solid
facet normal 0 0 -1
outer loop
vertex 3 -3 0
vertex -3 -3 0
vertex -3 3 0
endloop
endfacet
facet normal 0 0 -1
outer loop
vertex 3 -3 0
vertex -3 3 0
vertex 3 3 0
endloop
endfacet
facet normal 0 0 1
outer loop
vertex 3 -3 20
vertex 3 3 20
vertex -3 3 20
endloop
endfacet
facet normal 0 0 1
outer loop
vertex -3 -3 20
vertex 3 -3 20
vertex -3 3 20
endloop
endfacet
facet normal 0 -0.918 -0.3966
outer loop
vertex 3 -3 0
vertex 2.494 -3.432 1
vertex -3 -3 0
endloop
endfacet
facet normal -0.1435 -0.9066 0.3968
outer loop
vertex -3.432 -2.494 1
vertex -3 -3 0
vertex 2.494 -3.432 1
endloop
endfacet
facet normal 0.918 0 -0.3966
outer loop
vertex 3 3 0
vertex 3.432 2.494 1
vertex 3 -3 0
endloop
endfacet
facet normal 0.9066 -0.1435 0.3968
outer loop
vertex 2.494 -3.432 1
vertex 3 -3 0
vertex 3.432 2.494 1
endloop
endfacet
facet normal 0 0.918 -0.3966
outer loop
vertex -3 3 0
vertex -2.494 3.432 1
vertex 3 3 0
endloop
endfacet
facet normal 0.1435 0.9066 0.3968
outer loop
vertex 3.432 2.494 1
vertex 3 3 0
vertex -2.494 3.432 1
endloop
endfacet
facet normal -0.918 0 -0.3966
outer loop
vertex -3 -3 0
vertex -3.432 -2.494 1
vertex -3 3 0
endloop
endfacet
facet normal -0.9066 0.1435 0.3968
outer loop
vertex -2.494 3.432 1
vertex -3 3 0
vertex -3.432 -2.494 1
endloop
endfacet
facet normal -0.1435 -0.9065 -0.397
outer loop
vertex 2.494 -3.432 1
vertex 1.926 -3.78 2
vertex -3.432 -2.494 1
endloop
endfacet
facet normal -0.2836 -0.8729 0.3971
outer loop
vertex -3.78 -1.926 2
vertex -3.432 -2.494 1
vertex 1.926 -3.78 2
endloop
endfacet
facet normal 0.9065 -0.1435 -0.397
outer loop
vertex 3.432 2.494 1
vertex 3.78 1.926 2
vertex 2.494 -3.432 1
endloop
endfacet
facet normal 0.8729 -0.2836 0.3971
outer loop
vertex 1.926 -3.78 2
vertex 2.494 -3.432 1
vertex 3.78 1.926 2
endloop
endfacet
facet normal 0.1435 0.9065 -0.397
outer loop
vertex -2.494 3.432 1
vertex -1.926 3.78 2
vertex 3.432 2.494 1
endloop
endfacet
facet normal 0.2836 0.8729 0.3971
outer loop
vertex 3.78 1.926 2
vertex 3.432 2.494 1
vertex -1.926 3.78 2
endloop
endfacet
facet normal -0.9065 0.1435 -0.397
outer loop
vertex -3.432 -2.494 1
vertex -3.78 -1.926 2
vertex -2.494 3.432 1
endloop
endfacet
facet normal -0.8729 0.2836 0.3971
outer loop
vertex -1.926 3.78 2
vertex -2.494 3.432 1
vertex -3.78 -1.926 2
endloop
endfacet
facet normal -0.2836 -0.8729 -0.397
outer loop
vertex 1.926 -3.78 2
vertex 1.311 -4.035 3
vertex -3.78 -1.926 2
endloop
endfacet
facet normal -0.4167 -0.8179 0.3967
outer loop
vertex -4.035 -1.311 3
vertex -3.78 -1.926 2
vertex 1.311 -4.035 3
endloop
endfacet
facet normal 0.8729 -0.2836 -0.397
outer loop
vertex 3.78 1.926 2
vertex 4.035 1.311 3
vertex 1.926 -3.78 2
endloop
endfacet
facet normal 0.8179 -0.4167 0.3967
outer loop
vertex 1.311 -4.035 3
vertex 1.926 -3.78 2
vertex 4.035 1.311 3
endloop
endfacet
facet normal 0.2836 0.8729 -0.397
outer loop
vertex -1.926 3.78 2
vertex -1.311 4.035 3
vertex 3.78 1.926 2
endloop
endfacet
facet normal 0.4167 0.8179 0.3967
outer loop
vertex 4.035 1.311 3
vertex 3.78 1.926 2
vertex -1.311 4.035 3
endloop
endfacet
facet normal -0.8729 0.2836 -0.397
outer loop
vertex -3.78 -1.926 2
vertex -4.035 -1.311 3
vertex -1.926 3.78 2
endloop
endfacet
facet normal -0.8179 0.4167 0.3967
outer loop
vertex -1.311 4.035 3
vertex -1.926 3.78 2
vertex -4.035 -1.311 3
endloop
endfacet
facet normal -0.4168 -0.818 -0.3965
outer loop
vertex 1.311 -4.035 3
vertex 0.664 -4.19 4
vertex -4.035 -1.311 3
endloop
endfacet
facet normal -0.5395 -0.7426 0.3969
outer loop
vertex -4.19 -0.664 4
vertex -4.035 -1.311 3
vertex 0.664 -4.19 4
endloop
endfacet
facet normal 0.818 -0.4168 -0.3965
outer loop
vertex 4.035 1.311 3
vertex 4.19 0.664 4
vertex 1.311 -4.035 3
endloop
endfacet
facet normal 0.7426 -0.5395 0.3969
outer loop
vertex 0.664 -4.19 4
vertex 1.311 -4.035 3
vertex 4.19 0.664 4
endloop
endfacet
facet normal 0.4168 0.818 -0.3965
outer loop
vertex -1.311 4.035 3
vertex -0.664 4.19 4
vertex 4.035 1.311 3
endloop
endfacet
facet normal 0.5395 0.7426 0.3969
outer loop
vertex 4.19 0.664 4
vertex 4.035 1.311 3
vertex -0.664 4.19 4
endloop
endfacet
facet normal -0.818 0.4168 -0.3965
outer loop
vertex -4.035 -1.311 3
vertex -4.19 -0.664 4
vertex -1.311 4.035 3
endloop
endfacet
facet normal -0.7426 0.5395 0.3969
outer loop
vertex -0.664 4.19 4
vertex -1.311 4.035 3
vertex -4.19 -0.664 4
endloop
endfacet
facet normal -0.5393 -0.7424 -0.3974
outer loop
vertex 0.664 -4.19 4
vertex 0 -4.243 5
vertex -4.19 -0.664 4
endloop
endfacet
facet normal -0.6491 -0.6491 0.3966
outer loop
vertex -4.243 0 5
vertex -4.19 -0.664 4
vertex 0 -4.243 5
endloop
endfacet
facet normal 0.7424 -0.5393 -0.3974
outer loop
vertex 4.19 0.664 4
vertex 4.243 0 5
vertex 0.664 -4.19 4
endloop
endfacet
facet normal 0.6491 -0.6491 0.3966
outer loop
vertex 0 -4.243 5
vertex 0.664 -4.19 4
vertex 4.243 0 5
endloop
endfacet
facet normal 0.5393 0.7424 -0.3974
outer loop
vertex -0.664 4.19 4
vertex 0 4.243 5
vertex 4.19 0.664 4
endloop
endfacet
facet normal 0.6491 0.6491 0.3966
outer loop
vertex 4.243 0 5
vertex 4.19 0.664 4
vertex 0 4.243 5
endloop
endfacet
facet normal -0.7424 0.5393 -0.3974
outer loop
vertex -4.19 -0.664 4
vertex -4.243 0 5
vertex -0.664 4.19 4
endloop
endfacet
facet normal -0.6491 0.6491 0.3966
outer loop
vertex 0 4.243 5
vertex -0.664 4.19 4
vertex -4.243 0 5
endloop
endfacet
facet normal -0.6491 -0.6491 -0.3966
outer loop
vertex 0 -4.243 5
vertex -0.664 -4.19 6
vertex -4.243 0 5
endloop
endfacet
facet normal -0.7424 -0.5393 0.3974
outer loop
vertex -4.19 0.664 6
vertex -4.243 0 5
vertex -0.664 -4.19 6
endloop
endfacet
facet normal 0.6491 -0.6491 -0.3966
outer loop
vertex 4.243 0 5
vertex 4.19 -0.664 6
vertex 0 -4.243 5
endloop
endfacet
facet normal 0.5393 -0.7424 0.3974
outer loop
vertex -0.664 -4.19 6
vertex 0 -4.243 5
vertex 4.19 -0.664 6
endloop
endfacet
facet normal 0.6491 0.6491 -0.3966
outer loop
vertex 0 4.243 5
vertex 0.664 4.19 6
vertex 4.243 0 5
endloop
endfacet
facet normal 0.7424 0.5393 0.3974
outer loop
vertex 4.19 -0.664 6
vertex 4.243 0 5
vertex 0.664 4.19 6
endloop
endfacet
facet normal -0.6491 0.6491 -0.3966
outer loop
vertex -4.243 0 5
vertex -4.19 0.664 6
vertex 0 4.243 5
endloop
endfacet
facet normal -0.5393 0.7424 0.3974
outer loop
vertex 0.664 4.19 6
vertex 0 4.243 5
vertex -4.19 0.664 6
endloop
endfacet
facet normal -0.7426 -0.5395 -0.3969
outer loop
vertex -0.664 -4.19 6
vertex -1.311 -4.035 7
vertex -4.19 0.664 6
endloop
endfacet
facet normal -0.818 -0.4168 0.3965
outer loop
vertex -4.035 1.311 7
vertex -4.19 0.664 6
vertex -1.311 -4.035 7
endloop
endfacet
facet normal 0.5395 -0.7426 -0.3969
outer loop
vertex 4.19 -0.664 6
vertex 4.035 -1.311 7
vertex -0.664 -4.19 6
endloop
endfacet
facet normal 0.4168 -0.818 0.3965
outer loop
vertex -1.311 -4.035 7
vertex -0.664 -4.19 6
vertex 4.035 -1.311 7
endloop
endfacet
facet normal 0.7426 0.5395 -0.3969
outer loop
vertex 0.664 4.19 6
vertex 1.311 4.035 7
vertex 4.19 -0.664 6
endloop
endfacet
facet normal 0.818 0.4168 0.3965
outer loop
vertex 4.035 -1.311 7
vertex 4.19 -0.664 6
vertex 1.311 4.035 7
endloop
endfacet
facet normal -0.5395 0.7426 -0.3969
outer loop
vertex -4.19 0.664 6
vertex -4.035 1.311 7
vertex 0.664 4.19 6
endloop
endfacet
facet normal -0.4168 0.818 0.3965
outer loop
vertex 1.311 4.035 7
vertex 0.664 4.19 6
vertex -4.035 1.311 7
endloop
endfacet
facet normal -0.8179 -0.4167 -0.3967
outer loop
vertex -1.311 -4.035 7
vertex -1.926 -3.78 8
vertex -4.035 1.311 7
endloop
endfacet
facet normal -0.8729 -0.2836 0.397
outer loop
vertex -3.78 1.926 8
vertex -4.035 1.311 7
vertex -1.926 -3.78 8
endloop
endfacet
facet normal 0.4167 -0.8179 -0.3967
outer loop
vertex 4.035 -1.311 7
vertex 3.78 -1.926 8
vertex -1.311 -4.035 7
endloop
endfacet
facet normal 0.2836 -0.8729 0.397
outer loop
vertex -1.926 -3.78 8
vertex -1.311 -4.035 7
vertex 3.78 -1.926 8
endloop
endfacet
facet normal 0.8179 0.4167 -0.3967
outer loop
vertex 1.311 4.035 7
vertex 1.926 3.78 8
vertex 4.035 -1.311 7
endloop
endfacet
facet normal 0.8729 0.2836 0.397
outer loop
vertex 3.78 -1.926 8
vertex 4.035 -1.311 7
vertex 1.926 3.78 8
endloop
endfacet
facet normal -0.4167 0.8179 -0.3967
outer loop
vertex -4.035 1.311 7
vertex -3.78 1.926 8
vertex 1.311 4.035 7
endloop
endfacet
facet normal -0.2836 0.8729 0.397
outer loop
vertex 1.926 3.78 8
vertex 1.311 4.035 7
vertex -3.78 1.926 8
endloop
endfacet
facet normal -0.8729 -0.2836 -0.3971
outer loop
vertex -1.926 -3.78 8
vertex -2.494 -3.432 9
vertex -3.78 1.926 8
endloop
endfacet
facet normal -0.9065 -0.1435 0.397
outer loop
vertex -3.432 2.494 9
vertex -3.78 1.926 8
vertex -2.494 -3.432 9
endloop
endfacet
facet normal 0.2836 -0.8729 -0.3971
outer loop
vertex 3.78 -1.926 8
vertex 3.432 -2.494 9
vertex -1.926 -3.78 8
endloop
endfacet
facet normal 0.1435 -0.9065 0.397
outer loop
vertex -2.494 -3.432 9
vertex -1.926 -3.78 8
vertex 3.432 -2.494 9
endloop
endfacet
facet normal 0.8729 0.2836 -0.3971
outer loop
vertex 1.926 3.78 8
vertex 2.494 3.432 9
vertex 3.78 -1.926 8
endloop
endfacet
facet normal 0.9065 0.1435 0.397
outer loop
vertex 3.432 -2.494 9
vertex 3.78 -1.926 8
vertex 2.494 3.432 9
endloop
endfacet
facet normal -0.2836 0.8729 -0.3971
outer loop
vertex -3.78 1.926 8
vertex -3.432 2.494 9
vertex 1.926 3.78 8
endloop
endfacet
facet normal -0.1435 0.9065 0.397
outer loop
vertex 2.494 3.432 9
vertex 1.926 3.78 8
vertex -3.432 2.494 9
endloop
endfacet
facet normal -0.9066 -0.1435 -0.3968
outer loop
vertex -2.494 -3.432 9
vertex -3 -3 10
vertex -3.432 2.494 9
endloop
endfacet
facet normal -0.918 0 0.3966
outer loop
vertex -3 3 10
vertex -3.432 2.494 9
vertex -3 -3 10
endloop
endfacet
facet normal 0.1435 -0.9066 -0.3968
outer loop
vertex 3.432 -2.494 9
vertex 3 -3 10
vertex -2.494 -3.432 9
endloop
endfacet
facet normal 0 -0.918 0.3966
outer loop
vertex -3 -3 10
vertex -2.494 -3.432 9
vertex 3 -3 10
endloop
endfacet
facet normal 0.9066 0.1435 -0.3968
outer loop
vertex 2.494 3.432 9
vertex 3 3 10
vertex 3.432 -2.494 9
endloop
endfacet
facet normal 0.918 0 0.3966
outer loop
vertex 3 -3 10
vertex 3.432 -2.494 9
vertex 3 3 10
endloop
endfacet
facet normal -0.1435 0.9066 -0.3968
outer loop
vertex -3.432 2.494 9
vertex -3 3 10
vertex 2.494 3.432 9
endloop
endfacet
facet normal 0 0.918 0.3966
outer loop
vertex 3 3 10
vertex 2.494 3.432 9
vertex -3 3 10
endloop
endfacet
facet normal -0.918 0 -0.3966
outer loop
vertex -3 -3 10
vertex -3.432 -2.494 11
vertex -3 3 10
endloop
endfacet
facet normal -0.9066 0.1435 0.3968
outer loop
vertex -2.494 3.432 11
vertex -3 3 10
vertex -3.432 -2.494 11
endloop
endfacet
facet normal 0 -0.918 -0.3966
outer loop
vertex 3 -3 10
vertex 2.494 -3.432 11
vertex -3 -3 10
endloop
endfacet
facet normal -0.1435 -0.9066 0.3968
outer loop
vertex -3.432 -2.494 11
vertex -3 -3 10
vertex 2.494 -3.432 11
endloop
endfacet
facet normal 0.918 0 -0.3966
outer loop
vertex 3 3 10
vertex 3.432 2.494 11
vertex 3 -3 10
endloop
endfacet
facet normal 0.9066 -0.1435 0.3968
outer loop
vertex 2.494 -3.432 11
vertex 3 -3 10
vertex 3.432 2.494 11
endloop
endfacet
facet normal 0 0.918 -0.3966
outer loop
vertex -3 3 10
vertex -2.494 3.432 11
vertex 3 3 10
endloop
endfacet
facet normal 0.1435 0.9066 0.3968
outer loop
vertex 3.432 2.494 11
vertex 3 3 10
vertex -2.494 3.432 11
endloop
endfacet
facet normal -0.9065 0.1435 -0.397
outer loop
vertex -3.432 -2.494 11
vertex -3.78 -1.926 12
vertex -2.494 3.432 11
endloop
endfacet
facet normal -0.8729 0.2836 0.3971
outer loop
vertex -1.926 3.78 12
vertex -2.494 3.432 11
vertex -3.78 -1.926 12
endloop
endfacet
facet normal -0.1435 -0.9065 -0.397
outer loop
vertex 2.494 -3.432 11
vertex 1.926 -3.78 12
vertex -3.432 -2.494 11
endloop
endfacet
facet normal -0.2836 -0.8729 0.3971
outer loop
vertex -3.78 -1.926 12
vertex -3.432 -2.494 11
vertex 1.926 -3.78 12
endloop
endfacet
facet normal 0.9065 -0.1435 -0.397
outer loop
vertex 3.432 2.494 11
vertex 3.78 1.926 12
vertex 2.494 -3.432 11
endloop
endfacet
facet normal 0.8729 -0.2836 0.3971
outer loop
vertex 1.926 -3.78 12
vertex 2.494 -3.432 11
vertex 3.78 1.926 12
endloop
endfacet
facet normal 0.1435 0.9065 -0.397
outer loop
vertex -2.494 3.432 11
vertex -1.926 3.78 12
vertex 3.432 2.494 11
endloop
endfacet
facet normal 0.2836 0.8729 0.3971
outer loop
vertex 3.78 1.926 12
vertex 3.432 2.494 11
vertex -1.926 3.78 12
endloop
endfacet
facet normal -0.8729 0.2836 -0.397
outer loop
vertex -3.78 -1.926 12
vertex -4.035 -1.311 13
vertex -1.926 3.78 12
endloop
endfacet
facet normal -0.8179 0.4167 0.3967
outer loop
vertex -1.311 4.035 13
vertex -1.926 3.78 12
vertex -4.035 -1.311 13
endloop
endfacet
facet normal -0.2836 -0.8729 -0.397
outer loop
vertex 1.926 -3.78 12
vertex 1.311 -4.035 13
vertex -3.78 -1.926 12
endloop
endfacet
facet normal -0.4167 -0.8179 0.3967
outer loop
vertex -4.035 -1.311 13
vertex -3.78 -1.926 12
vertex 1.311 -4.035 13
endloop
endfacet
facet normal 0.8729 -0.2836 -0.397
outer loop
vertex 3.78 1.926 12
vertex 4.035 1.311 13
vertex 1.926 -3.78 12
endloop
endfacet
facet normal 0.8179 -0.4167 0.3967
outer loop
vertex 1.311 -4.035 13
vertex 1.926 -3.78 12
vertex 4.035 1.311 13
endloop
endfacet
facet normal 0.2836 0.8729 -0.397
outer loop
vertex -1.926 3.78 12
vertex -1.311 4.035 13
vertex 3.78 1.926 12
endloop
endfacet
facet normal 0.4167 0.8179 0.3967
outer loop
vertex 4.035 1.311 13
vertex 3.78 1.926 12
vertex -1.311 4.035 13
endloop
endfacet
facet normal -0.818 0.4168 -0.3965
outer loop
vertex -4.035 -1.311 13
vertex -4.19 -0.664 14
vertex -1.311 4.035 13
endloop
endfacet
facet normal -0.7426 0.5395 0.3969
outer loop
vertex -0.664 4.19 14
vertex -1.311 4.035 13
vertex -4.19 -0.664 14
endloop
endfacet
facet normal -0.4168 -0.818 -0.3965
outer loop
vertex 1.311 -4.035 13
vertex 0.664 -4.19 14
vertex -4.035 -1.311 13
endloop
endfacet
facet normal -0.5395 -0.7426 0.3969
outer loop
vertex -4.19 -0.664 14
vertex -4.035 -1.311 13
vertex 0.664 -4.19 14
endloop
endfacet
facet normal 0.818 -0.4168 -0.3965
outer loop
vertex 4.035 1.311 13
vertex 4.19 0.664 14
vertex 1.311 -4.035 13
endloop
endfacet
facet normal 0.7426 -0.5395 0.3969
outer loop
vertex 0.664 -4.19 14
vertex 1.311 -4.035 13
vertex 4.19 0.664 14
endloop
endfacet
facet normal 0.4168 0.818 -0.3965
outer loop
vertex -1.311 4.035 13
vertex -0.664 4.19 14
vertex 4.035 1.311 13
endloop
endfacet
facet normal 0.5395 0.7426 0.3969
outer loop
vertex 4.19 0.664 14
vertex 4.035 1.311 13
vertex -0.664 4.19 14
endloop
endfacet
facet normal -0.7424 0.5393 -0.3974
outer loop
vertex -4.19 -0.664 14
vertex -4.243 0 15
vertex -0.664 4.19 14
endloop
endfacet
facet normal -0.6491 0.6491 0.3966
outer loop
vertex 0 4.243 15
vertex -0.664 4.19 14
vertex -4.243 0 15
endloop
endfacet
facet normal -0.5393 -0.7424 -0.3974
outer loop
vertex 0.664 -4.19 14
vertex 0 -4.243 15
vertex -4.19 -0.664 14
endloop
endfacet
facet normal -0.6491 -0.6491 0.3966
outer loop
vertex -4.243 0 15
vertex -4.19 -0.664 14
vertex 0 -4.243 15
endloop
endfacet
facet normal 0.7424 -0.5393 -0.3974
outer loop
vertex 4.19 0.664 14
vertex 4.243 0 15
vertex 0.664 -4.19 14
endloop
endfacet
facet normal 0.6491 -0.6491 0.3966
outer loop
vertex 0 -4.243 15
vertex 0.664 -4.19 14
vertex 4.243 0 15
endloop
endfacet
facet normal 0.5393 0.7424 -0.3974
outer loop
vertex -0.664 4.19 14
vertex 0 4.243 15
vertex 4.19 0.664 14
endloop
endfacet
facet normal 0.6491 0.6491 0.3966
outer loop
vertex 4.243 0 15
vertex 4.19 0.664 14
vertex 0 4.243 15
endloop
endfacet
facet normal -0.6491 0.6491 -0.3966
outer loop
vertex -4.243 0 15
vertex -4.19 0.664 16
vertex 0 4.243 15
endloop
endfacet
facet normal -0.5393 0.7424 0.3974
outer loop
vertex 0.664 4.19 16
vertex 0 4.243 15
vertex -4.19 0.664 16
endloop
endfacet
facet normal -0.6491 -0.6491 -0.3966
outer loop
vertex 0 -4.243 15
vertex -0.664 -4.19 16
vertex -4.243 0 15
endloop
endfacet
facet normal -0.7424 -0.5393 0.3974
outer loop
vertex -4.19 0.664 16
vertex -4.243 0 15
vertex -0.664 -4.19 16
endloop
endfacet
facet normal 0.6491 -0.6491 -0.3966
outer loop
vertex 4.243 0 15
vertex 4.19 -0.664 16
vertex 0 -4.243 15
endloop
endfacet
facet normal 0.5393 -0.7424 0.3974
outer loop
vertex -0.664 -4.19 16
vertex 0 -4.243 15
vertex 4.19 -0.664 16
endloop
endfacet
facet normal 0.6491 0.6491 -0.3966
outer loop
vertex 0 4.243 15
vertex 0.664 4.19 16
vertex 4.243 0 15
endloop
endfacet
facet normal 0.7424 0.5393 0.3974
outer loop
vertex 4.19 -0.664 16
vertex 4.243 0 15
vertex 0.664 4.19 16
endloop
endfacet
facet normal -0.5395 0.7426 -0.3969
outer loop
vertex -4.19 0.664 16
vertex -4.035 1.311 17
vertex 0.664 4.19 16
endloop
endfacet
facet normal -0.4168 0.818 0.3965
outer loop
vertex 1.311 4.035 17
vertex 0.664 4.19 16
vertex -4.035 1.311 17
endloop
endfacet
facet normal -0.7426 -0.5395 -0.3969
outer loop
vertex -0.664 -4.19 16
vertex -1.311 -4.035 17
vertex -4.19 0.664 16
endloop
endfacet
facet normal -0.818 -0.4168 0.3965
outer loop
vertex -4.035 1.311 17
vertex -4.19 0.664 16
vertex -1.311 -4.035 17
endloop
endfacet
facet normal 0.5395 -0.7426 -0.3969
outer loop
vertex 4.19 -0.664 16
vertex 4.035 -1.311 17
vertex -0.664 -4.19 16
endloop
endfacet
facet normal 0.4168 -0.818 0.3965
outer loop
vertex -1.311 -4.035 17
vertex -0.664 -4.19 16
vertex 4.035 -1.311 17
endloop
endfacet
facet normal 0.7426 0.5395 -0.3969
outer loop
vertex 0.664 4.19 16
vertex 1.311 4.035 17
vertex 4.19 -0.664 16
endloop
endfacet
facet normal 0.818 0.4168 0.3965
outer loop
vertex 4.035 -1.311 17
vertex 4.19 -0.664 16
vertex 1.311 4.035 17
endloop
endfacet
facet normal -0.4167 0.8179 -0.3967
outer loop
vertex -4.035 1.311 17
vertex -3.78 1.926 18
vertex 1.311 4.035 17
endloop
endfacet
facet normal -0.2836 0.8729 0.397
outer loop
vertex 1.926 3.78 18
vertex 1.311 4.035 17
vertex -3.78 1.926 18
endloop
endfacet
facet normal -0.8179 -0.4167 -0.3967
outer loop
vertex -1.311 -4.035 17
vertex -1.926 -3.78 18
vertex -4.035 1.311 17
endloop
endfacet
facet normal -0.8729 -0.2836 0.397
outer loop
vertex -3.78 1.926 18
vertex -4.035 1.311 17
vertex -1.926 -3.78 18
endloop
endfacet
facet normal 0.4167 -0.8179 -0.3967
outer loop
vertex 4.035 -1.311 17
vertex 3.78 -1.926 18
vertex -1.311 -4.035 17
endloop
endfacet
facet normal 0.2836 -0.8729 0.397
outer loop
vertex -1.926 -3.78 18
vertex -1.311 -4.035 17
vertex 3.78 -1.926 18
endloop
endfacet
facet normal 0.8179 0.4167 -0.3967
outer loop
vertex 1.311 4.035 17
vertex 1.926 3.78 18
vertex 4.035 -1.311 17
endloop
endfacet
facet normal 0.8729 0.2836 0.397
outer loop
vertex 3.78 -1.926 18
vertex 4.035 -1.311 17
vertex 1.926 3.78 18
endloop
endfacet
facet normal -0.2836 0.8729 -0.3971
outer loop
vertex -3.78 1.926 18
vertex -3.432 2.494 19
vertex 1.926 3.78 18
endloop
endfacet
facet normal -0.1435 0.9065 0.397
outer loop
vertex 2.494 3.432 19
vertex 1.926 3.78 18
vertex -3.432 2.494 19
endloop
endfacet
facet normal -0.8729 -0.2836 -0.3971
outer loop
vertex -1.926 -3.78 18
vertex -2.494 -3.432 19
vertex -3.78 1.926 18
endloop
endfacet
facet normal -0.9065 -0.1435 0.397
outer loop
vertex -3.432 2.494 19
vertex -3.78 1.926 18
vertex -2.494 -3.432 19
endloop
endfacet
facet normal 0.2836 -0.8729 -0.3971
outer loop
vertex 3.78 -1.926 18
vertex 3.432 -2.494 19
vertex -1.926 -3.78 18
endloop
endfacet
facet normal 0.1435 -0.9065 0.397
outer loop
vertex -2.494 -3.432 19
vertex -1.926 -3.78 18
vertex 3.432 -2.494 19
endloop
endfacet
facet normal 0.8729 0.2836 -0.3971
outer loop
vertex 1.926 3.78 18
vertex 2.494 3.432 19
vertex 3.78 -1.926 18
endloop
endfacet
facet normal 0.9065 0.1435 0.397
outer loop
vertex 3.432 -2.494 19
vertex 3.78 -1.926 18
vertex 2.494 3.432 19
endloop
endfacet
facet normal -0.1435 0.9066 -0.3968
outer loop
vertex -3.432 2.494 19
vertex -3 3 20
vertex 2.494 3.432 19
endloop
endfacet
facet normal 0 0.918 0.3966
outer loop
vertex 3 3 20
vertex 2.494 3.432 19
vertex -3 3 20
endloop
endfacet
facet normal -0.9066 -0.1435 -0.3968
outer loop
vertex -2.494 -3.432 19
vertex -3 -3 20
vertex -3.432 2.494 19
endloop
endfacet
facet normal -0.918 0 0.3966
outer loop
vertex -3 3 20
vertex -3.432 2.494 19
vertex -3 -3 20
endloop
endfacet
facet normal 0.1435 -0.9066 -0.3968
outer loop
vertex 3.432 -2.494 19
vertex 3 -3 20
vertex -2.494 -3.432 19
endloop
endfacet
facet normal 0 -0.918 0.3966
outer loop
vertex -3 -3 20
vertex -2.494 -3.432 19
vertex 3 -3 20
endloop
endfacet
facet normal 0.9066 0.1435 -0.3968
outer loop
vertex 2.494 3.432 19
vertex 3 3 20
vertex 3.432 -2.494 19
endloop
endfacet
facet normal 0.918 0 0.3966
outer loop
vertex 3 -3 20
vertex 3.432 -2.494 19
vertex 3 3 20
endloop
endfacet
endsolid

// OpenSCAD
linear_extrude(20, twist=180, slices=20, $fn=6) square(6, center=true);
